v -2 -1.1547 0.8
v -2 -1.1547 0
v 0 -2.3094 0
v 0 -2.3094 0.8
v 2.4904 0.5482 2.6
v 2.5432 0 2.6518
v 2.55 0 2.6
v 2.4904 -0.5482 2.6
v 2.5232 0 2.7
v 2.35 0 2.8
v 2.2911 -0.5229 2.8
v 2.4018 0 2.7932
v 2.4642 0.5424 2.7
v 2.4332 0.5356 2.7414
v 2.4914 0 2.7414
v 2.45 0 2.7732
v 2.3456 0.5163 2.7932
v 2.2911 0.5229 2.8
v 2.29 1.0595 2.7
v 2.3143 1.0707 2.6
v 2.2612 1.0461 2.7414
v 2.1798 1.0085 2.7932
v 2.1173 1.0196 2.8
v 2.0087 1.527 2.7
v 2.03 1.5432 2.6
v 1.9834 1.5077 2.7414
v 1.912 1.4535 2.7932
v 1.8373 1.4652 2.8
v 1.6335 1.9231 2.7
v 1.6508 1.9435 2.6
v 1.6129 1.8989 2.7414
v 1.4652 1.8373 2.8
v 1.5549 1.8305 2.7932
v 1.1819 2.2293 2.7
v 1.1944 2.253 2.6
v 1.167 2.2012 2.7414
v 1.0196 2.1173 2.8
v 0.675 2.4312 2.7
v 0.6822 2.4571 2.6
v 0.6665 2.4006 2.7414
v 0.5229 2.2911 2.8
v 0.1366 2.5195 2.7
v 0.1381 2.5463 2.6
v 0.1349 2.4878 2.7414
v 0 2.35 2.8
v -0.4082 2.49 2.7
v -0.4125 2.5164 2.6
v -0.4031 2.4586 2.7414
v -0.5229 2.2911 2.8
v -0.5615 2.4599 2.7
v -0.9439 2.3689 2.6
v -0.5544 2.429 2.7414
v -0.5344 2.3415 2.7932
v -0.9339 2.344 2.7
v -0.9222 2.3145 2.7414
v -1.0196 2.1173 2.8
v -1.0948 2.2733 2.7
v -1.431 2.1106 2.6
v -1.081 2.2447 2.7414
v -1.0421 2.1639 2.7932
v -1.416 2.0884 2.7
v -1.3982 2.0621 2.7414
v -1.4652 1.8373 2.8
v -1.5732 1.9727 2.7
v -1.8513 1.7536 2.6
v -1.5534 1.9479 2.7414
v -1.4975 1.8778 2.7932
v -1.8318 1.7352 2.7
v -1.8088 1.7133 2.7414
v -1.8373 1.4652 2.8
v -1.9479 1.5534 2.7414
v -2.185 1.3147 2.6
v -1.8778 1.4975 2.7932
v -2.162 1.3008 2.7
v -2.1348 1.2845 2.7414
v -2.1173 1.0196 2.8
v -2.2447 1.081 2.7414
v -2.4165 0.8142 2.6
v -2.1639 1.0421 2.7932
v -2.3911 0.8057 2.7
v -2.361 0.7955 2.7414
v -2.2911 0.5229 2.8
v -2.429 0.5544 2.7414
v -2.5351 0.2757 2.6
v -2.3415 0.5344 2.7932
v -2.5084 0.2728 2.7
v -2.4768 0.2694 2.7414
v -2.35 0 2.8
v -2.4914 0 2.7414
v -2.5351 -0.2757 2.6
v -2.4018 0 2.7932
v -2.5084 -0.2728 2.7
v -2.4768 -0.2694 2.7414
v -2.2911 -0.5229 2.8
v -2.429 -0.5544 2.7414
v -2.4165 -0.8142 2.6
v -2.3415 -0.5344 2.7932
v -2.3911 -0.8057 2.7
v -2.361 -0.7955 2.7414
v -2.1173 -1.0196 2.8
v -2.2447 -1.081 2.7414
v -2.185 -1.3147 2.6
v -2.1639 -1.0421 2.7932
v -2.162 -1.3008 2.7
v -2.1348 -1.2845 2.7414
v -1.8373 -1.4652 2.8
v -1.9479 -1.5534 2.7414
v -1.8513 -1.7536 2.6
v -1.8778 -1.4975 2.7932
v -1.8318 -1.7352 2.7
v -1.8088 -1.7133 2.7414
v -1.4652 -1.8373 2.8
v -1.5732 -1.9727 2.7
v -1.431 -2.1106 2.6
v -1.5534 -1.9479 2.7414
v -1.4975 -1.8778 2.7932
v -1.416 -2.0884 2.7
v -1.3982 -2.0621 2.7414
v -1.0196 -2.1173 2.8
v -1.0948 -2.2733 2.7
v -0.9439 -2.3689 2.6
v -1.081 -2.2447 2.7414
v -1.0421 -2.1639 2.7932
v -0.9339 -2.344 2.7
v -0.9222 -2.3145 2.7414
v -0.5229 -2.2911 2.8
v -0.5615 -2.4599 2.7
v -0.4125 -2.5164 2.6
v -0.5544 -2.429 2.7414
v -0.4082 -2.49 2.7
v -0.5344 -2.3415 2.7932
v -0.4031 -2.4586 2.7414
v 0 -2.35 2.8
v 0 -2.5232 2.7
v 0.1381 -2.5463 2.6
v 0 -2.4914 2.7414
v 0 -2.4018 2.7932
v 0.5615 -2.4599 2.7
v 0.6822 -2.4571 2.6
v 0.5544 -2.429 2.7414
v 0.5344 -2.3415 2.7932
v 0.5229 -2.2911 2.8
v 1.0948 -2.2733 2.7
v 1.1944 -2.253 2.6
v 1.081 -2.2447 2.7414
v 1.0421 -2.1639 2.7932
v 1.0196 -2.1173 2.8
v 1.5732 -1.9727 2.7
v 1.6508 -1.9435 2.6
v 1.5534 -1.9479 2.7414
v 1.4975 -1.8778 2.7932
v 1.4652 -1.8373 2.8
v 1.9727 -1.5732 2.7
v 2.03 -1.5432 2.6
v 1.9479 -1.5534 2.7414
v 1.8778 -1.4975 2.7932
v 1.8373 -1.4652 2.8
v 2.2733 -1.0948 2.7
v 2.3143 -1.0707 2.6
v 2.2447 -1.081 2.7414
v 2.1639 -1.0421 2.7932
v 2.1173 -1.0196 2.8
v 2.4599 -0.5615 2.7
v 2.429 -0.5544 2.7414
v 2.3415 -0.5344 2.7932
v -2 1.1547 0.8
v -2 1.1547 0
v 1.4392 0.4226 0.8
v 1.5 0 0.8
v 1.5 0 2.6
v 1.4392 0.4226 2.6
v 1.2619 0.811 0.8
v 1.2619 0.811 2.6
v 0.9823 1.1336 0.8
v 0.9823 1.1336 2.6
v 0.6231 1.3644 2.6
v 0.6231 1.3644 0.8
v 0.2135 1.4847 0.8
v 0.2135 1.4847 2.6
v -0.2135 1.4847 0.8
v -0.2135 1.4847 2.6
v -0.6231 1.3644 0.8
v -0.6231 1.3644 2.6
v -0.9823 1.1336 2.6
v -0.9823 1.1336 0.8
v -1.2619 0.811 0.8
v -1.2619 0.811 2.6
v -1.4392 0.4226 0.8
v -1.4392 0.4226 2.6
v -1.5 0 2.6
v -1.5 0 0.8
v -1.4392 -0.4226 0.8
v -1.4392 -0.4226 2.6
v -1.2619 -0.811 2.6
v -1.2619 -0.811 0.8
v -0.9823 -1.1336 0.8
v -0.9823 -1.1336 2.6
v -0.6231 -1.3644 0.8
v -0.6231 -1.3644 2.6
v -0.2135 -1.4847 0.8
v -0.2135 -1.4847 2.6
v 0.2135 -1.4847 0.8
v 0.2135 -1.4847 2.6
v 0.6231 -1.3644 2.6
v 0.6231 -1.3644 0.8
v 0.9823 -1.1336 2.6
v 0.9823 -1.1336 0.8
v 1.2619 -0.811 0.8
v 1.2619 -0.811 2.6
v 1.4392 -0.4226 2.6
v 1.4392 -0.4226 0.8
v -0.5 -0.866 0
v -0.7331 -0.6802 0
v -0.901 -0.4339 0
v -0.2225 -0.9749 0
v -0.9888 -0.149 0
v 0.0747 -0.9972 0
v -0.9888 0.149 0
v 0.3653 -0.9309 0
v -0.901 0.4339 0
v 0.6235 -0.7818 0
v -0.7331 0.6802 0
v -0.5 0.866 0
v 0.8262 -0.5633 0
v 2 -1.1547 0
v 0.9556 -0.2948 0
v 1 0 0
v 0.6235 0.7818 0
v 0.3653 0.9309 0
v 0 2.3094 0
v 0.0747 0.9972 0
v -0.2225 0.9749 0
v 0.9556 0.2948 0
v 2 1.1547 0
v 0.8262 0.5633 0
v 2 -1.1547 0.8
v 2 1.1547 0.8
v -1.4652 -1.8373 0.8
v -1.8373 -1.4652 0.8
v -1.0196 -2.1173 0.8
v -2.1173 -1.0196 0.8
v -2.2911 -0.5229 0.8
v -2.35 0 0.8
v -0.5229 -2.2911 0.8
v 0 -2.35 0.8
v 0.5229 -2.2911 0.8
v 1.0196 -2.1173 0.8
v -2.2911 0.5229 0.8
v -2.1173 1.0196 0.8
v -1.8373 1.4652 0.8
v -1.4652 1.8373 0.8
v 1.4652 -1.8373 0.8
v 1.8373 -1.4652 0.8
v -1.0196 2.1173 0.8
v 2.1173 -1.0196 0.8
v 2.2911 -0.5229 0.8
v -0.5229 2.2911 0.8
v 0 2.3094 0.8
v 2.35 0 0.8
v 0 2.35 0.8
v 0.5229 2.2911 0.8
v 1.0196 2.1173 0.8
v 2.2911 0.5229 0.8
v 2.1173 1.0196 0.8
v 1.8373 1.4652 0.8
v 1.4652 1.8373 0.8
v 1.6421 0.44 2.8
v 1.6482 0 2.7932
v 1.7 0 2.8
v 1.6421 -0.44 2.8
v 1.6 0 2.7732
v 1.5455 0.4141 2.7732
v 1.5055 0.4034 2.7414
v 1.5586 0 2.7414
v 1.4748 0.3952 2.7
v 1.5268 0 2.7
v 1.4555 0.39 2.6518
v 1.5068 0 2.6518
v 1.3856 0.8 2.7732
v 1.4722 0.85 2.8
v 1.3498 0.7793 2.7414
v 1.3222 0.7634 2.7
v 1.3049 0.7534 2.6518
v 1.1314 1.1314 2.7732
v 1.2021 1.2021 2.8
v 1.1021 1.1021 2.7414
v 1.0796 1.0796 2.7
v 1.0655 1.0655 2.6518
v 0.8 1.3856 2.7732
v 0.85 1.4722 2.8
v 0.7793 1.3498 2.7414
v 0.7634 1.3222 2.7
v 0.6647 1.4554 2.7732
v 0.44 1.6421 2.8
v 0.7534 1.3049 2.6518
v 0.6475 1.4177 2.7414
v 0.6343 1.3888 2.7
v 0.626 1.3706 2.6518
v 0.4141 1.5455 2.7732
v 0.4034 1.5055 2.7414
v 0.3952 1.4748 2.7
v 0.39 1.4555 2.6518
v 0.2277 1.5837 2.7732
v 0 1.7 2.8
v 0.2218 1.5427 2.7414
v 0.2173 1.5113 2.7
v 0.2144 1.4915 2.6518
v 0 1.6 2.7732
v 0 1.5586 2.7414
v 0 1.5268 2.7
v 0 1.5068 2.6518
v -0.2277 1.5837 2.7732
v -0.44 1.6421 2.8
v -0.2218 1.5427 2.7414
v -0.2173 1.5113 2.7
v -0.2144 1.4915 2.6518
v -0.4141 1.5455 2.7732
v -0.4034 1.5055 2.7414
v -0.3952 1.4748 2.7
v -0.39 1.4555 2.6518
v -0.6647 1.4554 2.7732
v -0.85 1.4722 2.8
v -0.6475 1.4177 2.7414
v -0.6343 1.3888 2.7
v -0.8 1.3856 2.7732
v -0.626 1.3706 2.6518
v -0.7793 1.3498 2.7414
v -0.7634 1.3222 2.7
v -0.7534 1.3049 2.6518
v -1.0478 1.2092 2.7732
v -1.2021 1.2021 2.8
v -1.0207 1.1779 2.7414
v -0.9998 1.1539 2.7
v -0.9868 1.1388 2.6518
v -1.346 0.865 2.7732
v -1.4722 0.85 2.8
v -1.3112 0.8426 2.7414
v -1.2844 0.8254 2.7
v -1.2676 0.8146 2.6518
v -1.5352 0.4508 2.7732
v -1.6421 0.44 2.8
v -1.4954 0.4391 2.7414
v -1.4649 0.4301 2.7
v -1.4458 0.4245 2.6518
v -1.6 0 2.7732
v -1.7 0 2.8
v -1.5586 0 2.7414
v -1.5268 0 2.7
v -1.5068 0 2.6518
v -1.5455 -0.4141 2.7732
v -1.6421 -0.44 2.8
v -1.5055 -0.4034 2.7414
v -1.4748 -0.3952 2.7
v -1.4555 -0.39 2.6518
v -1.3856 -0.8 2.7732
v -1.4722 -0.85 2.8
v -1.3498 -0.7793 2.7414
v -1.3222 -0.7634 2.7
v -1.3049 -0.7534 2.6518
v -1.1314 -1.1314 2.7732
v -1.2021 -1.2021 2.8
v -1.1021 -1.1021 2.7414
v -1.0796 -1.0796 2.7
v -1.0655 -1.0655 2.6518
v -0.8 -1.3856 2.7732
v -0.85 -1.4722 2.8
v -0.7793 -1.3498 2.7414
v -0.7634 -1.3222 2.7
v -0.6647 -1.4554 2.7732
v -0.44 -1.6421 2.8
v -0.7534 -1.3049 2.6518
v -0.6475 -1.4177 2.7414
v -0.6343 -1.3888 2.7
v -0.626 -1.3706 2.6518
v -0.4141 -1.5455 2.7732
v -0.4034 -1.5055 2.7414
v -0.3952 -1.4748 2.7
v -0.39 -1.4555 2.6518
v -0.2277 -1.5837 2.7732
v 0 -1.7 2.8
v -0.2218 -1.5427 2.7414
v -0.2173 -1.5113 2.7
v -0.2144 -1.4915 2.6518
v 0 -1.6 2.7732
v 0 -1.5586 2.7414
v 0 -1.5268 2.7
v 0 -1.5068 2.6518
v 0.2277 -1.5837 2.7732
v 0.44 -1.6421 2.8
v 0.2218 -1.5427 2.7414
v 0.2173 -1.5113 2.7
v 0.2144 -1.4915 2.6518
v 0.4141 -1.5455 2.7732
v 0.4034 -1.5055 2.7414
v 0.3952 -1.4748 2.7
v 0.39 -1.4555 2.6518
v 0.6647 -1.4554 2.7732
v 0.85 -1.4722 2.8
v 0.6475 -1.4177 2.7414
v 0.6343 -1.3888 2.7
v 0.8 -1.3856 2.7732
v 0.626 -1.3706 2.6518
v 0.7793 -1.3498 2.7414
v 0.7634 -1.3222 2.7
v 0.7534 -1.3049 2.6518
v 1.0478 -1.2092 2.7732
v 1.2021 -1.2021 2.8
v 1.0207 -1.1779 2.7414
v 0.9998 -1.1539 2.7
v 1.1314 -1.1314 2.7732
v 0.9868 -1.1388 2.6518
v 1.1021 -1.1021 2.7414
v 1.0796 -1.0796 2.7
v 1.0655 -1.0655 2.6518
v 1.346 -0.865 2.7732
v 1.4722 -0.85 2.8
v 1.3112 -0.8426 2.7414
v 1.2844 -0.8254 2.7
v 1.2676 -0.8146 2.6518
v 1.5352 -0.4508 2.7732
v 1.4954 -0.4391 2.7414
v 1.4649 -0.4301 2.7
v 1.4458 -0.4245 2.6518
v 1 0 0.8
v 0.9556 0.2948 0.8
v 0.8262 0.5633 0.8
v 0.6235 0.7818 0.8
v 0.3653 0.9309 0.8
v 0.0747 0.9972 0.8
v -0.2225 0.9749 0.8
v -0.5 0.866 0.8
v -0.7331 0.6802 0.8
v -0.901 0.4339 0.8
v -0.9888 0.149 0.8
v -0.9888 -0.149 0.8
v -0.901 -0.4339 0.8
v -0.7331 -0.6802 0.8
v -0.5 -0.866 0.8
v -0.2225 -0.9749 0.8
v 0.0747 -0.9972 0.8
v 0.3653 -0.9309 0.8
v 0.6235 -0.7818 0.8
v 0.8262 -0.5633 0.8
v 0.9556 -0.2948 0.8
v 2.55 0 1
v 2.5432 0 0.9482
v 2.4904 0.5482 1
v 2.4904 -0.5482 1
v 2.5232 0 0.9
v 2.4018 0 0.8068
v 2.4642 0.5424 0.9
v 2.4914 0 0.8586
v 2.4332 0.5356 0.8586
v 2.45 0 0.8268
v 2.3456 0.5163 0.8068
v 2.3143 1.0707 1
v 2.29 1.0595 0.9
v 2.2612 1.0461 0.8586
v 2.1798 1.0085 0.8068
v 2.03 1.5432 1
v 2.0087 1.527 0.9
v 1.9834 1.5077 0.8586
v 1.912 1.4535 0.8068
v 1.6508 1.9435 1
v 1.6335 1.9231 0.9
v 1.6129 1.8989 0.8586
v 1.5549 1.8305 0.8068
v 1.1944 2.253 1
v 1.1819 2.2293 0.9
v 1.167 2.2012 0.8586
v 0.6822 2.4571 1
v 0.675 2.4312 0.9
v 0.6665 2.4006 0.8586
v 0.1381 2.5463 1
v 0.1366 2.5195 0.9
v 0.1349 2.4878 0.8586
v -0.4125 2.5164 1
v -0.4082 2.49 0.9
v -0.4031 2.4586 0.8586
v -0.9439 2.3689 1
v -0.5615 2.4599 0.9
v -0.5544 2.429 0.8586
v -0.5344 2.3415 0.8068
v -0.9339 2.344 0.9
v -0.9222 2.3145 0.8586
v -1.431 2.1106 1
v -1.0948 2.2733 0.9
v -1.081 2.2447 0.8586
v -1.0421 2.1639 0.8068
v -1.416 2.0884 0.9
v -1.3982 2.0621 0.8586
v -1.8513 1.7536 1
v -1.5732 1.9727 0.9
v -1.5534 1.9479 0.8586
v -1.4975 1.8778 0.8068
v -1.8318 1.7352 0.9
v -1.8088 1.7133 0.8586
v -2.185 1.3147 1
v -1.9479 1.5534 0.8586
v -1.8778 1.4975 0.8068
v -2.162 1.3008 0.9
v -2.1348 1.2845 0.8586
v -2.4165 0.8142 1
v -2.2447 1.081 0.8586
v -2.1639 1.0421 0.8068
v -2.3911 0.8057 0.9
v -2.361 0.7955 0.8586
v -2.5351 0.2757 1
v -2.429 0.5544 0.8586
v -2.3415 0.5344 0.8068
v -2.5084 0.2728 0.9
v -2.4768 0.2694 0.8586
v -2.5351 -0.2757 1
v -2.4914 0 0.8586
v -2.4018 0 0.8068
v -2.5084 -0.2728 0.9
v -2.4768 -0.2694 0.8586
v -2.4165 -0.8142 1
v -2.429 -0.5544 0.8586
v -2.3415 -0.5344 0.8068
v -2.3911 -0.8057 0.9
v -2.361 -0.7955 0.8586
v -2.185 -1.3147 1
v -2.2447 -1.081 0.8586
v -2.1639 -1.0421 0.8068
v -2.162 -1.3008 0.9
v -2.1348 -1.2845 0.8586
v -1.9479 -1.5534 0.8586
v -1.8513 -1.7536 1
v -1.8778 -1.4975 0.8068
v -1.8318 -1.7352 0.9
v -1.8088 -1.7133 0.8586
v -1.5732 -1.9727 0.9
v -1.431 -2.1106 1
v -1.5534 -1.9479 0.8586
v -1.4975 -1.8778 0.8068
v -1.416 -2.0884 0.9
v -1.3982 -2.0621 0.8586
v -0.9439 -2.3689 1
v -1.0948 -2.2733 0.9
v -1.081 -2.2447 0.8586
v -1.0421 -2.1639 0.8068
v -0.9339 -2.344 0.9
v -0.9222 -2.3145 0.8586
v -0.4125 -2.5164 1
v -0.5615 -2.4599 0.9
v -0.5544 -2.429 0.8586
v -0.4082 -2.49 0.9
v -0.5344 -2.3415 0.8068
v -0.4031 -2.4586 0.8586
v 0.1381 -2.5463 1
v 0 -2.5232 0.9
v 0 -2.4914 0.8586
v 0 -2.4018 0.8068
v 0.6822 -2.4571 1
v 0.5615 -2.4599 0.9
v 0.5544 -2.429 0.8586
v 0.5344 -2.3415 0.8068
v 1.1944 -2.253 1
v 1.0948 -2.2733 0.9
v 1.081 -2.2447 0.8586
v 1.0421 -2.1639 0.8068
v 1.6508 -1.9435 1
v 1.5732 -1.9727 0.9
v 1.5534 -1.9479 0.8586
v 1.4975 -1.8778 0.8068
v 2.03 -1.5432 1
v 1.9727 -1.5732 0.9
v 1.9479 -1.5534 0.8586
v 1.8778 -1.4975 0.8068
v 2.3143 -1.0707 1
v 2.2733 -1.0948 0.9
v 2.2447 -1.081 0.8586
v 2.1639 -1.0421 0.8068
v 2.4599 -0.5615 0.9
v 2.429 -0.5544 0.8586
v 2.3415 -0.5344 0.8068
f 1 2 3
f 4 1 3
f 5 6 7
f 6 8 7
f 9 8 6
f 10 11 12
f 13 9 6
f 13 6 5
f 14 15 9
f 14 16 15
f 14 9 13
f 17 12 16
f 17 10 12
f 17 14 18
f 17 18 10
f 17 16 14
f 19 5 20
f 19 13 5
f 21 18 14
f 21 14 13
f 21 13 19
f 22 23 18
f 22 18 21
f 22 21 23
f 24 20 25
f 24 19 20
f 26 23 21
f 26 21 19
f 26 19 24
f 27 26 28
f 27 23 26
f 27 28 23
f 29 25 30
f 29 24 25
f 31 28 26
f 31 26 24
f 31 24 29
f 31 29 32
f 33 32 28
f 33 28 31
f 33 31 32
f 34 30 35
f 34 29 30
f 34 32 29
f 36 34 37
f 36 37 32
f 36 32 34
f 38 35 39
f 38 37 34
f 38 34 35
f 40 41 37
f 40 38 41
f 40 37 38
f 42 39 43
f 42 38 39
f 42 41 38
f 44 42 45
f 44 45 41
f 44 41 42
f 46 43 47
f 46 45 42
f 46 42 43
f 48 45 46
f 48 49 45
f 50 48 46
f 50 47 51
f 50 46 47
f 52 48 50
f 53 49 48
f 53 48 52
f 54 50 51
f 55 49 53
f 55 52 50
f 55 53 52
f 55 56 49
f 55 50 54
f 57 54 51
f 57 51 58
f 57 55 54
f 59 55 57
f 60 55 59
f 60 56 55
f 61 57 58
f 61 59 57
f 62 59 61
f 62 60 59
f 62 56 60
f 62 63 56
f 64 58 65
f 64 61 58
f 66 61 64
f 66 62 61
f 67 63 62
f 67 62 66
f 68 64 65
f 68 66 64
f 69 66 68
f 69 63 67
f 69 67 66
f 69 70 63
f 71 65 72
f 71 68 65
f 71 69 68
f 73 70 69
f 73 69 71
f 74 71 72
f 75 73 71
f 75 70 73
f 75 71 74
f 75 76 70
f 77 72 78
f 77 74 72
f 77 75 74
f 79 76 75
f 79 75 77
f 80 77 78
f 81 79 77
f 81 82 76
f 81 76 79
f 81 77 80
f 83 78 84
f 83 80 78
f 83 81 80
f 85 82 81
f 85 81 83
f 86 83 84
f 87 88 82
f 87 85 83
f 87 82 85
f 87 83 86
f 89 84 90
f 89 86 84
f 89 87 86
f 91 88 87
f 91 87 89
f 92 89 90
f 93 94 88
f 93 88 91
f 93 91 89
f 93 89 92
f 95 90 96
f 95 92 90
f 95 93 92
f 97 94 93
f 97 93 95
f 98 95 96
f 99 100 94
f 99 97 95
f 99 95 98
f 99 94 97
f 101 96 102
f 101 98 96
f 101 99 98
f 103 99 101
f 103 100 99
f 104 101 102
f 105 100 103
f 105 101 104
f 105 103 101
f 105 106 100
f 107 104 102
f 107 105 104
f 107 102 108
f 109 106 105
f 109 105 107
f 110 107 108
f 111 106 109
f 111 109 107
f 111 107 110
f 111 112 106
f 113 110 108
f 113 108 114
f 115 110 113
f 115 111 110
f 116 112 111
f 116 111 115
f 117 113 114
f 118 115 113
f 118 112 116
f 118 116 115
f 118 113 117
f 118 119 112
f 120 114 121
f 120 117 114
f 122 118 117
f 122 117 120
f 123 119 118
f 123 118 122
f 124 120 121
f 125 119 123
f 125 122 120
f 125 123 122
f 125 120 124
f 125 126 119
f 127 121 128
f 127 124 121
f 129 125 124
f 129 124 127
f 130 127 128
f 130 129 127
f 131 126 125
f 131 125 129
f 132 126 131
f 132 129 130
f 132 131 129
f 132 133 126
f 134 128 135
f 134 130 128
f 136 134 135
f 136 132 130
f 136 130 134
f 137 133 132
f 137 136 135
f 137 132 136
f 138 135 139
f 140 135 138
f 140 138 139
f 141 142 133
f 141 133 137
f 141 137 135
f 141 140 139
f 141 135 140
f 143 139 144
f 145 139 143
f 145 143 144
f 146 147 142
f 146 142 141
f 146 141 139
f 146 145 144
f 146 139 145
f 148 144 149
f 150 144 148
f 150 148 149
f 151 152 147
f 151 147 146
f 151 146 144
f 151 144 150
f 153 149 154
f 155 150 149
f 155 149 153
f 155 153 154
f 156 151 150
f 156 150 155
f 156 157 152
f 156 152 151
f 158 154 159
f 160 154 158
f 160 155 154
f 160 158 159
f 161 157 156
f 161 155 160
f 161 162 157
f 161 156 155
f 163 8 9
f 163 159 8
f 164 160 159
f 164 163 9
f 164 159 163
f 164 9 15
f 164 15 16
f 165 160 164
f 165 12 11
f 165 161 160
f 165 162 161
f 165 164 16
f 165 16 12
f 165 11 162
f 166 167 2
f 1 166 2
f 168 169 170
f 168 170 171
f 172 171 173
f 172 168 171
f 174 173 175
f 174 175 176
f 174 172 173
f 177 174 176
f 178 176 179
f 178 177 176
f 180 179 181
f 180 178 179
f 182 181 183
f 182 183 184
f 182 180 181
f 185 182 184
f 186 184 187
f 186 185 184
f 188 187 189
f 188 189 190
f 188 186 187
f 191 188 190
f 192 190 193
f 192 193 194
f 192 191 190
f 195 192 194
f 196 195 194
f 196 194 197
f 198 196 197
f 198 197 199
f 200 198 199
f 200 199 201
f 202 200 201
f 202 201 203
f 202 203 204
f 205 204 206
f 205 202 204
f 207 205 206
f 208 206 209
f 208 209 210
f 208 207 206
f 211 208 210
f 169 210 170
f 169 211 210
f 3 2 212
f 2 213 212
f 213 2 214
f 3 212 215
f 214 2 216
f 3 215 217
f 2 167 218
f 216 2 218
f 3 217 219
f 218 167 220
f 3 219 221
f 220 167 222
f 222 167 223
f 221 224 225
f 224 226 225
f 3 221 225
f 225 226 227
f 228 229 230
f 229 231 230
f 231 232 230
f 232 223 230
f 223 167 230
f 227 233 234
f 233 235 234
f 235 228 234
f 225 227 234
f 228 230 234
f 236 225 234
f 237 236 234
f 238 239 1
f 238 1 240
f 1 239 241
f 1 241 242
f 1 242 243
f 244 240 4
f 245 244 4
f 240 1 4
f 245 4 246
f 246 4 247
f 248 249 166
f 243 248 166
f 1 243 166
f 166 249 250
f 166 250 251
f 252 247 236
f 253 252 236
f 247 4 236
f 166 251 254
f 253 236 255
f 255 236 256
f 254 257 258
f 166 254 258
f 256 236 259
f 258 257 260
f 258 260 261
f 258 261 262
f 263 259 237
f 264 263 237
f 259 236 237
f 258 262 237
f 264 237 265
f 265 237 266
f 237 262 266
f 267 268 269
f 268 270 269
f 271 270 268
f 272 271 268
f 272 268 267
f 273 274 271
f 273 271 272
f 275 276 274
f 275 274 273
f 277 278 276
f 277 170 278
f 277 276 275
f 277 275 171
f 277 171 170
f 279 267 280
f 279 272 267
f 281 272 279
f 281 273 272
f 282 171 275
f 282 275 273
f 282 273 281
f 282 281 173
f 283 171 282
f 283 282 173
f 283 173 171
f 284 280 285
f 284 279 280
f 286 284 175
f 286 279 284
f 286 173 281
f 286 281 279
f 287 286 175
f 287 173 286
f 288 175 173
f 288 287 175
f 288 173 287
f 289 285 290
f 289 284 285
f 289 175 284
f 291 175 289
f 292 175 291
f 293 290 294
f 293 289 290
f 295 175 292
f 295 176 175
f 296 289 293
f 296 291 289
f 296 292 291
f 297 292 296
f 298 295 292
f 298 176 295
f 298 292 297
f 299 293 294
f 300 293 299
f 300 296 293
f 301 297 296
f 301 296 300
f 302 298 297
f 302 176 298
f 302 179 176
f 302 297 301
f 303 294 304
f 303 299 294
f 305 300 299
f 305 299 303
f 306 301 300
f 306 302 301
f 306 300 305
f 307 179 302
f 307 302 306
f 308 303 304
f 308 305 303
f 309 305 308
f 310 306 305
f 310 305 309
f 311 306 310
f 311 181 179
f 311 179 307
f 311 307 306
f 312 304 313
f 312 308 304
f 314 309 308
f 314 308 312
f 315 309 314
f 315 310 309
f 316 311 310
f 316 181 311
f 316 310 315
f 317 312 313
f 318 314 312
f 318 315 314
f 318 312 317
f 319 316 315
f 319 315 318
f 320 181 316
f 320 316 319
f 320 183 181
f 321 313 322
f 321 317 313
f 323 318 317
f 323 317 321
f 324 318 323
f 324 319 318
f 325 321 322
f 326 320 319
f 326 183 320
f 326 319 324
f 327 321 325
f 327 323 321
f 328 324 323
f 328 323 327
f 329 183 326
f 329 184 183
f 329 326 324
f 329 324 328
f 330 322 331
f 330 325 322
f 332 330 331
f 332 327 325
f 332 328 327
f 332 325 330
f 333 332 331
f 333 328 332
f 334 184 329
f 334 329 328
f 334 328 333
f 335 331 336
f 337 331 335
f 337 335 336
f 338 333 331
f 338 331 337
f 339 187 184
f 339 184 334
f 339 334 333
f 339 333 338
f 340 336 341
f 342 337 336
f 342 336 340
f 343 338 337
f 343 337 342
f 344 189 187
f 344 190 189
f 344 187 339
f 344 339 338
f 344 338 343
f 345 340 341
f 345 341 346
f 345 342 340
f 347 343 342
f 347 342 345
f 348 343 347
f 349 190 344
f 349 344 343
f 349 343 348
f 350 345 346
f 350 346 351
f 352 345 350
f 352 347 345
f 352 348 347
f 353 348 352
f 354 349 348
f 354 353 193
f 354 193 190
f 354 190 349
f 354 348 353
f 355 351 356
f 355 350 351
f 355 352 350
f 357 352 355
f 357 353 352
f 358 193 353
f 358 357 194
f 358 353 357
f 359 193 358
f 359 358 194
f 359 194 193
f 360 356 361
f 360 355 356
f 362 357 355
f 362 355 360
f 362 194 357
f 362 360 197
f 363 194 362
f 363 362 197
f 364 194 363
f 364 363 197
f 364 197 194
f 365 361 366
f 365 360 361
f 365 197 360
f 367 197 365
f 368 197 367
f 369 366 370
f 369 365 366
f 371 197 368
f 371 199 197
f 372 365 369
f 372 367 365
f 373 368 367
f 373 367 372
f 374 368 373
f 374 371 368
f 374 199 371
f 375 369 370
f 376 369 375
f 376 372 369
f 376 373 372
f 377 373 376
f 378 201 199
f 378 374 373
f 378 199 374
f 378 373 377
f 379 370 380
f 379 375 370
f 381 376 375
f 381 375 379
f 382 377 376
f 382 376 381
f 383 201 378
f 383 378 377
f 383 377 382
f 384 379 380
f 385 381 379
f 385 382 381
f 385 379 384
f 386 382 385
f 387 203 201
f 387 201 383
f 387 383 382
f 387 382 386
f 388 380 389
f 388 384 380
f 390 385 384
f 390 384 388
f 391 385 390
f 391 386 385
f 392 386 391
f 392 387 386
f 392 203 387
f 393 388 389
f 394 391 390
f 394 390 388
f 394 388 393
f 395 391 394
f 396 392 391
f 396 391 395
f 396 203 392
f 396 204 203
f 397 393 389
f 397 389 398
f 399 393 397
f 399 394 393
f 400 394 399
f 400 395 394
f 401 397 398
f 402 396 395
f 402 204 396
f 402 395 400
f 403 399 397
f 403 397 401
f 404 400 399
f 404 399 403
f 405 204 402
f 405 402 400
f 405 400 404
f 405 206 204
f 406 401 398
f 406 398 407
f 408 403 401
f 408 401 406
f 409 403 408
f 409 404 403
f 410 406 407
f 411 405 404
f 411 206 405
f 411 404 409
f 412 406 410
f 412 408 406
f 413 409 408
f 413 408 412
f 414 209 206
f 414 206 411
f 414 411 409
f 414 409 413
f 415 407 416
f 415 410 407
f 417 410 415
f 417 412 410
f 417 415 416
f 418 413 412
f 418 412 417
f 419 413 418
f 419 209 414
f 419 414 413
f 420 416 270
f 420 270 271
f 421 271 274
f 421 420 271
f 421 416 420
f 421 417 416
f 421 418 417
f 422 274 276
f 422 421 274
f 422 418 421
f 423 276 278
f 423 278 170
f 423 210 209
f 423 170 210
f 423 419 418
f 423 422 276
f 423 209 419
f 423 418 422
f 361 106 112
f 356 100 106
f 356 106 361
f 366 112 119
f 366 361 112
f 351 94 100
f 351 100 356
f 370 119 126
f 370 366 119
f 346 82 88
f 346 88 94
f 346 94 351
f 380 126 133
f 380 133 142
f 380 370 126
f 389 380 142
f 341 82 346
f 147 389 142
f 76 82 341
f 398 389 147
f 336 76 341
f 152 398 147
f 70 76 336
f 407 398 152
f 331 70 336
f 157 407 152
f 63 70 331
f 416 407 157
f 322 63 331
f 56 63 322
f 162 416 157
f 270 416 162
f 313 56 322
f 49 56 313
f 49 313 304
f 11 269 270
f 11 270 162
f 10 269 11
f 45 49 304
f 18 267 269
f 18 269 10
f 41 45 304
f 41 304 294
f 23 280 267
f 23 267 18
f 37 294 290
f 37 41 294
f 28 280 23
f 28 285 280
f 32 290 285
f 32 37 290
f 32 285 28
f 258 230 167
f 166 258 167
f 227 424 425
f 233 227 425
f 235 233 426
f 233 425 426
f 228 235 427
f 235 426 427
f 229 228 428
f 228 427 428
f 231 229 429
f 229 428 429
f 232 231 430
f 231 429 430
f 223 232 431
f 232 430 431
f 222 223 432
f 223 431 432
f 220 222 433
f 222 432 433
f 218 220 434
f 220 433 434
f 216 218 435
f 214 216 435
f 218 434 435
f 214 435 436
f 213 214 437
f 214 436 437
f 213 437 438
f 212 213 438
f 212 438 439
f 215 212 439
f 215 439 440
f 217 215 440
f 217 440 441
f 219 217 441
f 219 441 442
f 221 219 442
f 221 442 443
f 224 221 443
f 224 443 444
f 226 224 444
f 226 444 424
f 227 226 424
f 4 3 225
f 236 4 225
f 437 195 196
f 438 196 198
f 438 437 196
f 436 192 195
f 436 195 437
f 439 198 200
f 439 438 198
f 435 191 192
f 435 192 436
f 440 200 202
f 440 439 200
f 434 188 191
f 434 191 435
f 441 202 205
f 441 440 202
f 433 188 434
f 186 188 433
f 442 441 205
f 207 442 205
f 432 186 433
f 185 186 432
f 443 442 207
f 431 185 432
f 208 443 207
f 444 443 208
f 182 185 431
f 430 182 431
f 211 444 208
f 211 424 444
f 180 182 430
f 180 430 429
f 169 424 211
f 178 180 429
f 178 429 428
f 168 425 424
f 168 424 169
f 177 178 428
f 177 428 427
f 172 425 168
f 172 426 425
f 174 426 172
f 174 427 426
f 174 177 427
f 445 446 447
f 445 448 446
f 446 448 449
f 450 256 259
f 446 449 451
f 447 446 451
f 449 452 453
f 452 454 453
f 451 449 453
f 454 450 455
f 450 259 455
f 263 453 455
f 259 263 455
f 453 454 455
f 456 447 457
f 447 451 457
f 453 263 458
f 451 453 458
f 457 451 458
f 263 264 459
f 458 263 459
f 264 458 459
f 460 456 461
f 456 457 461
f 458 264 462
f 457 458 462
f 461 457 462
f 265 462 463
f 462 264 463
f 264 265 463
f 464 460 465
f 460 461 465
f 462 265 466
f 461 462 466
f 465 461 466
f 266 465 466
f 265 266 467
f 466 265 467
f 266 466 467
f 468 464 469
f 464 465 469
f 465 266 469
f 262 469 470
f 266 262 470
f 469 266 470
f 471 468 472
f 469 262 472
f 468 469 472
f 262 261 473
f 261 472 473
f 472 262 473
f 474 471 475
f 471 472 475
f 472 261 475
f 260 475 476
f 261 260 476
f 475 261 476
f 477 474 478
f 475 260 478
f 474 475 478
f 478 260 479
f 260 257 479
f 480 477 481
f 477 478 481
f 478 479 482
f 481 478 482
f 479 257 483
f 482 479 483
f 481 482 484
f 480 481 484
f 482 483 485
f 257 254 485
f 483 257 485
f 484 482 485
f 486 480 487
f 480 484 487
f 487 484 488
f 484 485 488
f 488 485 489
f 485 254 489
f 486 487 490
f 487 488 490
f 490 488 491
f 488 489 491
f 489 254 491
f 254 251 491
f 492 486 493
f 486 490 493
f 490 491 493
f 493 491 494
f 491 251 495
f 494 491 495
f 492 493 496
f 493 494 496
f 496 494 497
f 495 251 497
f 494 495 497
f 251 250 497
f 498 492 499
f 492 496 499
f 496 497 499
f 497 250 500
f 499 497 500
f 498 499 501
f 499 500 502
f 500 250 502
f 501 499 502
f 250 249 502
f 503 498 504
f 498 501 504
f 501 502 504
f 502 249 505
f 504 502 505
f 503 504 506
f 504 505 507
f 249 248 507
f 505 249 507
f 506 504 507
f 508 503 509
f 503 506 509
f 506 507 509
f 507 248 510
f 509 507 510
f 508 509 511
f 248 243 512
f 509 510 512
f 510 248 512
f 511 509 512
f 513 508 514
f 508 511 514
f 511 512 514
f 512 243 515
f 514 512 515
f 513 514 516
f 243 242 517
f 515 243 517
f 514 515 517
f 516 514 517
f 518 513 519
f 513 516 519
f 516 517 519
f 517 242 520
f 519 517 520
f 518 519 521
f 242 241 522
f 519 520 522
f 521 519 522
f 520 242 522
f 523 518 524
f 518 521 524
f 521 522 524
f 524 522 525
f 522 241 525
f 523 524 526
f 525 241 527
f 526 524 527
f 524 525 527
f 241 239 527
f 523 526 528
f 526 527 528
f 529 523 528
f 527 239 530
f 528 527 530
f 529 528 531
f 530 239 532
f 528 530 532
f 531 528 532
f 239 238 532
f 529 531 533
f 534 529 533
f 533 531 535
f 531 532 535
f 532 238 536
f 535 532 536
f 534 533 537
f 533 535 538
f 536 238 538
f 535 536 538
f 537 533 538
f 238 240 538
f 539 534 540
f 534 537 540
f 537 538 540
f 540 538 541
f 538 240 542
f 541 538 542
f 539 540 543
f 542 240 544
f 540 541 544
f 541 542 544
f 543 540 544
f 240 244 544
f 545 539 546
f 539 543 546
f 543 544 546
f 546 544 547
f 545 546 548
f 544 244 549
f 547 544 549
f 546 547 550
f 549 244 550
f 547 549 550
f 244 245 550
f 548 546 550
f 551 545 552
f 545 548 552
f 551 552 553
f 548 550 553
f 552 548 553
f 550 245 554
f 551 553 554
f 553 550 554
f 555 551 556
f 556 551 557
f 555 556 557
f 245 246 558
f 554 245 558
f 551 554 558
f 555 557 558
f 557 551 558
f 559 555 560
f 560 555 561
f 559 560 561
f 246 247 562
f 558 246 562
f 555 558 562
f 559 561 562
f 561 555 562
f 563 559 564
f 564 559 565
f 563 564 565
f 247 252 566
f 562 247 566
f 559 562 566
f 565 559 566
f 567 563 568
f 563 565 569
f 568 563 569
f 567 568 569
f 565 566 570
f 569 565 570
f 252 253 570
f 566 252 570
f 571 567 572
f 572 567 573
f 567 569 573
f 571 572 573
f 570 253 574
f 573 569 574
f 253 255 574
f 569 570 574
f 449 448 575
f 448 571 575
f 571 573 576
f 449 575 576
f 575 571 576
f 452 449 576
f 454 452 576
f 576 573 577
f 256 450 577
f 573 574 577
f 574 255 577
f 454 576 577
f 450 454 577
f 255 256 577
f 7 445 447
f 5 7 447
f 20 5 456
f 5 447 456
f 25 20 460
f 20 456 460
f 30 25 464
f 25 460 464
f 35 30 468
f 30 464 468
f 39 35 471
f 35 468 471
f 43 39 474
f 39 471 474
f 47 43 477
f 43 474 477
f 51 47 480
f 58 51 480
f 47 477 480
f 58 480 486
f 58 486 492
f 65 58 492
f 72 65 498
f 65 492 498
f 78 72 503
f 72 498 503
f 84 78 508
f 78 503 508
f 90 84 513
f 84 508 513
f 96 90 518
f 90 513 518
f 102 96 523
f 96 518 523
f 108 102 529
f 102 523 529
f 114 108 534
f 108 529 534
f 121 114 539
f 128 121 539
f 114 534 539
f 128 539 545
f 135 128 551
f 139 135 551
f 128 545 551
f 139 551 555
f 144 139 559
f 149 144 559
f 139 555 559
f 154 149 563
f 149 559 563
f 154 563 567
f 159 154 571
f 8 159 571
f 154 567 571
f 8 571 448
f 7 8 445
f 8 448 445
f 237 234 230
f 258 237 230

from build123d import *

# Parameters (mm, degrees)
EXTRUDE_1_DEPTH     = 0.8
SKETCH_2_R          = 2.55
SKETCH_2_R_2        = 1.5
EXTRUDE_2_DEPTH     = 2
SKETCH_3_R          = 1
CUT_EXTRUDE_1_DEPTH = 5.12371192
FILLET_1_R          = 0.2


with BuildPart() as part:
    # 草图1 → 凸台-拉伸1 (new body)
    with BuildSketch(Plane.XY):
        Polygon((0, -2.309401077), (2, -1.154700538), (2, 1.154700538), (0, 2.309401077), (-2, 1.154700538), (-2, -1.154700538), align=None)
    extrude(amount=EXTRUDE_1_DEPTH)

    # 草图2 → 凸台-拉伸2 (add)
    with BuildSketch(Plane.XY.offset(0.8)):
        Circle(SKETCH_2_R)
        Circle(SKETCH_2_R_2, mode=Mode.SUBTRACT)
    extrude(amount=EXTRUDE_2_DEPTH)

    # 草图3 → 切除-拉伸1 (cut, through all)
    with BuildSketch(Plane.XY.offset(0.8)):
        Circle(SKETCH_3_R)
    extrude(amount=-CUT_EXTRUDE_1_DEPTH, mode=Mode.SUBTRACT)

    # 圆角1
    fillet_1_edges = [part.edges().sort_by_distance(p)[0] for p in [
        (-2.55, 0, 2.8),
        (-2.55, 0, 0.8),
        (-1.5, 0, 2.8),
    ]]
    fillet(fillet_1_edges, radius=FILLET_1_R)


solid = part.part
